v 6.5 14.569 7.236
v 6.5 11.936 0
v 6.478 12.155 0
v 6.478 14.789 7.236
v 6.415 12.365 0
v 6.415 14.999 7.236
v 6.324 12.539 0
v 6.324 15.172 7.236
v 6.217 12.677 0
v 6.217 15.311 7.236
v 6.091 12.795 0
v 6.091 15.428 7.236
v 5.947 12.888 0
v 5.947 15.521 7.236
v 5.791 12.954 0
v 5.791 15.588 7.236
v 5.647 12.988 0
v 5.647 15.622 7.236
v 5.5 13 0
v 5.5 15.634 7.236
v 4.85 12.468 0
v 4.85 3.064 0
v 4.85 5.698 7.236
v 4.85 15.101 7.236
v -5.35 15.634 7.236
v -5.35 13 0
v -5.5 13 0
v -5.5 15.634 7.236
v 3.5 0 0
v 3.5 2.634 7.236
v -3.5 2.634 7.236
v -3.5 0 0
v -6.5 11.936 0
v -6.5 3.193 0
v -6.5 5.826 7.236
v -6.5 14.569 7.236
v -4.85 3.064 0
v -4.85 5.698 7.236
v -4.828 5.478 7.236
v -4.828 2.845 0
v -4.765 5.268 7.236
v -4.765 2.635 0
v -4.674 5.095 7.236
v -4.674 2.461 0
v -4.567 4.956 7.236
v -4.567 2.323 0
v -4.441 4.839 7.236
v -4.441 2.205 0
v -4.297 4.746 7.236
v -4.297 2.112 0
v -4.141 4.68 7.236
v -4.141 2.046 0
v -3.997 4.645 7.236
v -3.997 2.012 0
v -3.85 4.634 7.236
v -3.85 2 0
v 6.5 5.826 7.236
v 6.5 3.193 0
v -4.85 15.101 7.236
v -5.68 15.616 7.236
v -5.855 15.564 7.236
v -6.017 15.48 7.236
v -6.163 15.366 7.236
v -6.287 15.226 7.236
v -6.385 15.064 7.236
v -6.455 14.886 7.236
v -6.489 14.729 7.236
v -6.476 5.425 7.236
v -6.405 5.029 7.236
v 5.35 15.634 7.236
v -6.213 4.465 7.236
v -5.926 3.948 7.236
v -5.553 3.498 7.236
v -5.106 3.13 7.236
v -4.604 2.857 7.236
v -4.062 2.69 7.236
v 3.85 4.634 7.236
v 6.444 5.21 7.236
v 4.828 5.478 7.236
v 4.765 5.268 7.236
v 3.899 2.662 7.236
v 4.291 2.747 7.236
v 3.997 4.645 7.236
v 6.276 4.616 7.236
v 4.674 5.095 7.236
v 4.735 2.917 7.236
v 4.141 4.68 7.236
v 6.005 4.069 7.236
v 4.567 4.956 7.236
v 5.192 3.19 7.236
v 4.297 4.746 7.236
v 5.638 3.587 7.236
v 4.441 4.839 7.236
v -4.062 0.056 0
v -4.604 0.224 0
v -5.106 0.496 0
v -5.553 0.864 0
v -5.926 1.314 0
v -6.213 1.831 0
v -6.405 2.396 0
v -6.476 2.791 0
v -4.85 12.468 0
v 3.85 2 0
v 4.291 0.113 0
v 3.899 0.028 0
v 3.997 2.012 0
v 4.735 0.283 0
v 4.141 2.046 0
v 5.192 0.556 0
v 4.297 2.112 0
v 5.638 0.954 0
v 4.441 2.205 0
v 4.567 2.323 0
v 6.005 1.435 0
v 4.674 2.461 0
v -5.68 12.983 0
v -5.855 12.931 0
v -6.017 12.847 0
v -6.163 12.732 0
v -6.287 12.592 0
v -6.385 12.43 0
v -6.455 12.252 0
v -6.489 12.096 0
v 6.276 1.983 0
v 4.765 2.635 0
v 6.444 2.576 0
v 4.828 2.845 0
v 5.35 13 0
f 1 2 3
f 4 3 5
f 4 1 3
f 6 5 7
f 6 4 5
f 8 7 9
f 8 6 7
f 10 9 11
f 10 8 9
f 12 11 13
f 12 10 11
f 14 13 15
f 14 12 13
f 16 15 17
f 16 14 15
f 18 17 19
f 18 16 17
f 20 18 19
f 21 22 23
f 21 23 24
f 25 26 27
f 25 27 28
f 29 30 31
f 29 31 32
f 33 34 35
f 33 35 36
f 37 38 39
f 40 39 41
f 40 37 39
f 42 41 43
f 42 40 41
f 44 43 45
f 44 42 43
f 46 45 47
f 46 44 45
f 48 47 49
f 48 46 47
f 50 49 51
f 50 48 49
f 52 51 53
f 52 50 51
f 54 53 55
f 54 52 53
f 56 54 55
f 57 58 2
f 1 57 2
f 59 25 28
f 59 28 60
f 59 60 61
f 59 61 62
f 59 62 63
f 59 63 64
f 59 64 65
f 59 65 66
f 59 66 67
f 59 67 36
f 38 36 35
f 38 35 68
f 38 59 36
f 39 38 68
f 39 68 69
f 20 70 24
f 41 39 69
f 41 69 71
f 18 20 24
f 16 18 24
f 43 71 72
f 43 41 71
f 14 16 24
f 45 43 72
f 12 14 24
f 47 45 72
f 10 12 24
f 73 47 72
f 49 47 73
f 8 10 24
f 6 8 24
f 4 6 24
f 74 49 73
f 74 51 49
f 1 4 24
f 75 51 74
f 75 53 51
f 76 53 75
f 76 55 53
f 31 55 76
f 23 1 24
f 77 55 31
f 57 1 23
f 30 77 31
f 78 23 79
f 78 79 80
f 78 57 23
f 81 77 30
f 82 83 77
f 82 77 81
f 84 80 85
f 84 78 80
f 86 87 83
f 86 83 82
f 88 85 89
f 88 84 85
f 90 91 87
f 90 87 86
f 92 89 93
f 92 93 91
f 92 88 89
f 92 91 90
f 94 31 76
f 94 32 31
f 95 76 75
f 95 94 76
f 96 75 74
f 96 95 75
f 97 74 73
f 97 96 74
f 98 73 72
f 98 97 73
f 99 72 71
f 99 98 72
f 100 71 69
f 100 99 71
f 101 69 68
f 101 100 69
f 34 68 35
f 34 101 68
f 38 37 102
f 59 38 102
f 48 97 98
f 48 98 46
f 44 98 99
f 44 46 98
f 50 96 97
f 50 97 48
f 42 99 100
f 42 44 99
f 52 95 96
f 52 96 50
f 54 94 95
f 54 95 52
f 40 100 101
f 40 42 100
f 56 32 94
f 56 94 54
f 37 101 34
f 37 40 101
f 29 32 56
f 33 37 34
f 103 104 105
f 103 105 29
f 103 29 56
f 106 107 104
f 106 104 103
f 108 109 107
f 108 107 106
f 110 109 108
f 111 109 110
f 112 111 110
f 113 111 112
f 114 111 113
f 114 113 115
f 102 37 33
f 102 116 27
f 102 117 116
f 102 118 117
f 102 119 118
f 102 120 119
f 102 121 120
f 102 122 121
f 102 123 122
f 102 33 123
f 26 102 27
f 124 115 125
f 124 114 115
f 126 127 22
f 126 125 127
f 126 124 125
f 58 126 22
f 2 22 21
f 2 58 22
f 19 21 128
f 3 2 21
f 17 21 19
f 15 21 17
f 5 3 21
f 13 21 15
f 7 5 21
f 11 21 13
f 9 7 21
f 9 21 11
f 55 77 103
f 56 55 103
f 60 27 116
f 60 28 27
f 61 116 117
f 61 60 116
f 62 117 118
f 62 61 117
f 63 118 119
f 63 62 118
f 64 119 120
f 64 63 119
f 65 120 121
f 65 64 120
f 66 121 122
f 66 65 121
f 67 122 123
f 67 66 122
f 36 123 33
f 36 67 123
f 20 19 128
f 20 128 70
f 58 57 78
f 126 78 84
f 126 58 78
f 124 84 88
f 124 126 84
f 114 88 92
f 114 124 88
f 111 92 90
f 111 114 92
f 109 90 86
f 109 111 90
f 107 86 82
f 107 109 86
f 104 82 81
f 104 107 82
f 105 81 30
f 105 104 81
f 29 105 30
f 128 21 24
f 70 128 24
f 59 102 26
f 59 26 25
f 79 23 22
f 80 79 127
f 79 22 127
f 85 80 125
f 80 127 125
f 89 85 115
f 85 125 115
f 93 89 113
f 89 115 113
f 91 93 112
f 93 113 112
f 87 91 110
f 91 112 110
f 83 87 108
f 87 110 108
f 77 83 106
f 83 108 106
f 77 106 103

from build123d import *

# Parameters (mm, degrees)
F1_DEPTH = 6.5
F2_DEPTH = 4.85
F3_R     = 1
F4_SIZE  = 0.5
F5_R     = 3


with BuildPart() as f1:
    # F0 (on Right) → F1 (new body, symmetric)
    with BuildSketch(Plane.YZ):
        Polygon((4.633555, 7.235633), (2, 0), (13, 0), (15.633555, 7.235633), align=None)
        Polygon((2.633555, 7.235633), (0, 0), (2, 0), (4.633555, 7.235633), align=None)
    extrude(amount=F1_DEPTH, both=True)

    # F0 (on Right) → F2 (cut, symmetric)
    with BuildSketch(Plane.YZ):
        Polygon((4.633555, 7.235633), (2, 0), (13, 0), (15.633555, 7.235633), align=None)
    extrude(amount=F2_DEPTH, both=True, mode=Mode.SUBTRACT)

    # F3
    f3_edges = [f1.edges().sort_by_distance(p)[0] for p in [
        (4.85, 3.316778, 3.617817),
        (-4.85, 3.316778, 3.617817),
        (-6.5, 14.316778, 3.617817),
        (6.5, 14.316778, 3.617817),
    ]]
    fillet(f3_edges, radius=F3_R)

    # F4
    f4_edges = [f1.edges().sort_by_distance(p)[0] for p in [
        (4.85, 14.316778, 3.617817),
        (-4.85, 14.316778, 3.617817),
    ]]
    chamfer(f4_edges, length=F4_SIZE)

    # F5
    f5_edges = [f1.edges().sort_by_distance(p)[0] for p in [
        (6.5, 1.316778, 3.617817),
        (-6.5, 1.316778, 3.617817),
    ]]
    fillet(f5_edges, radius=F5_R)


solid = f1.part
